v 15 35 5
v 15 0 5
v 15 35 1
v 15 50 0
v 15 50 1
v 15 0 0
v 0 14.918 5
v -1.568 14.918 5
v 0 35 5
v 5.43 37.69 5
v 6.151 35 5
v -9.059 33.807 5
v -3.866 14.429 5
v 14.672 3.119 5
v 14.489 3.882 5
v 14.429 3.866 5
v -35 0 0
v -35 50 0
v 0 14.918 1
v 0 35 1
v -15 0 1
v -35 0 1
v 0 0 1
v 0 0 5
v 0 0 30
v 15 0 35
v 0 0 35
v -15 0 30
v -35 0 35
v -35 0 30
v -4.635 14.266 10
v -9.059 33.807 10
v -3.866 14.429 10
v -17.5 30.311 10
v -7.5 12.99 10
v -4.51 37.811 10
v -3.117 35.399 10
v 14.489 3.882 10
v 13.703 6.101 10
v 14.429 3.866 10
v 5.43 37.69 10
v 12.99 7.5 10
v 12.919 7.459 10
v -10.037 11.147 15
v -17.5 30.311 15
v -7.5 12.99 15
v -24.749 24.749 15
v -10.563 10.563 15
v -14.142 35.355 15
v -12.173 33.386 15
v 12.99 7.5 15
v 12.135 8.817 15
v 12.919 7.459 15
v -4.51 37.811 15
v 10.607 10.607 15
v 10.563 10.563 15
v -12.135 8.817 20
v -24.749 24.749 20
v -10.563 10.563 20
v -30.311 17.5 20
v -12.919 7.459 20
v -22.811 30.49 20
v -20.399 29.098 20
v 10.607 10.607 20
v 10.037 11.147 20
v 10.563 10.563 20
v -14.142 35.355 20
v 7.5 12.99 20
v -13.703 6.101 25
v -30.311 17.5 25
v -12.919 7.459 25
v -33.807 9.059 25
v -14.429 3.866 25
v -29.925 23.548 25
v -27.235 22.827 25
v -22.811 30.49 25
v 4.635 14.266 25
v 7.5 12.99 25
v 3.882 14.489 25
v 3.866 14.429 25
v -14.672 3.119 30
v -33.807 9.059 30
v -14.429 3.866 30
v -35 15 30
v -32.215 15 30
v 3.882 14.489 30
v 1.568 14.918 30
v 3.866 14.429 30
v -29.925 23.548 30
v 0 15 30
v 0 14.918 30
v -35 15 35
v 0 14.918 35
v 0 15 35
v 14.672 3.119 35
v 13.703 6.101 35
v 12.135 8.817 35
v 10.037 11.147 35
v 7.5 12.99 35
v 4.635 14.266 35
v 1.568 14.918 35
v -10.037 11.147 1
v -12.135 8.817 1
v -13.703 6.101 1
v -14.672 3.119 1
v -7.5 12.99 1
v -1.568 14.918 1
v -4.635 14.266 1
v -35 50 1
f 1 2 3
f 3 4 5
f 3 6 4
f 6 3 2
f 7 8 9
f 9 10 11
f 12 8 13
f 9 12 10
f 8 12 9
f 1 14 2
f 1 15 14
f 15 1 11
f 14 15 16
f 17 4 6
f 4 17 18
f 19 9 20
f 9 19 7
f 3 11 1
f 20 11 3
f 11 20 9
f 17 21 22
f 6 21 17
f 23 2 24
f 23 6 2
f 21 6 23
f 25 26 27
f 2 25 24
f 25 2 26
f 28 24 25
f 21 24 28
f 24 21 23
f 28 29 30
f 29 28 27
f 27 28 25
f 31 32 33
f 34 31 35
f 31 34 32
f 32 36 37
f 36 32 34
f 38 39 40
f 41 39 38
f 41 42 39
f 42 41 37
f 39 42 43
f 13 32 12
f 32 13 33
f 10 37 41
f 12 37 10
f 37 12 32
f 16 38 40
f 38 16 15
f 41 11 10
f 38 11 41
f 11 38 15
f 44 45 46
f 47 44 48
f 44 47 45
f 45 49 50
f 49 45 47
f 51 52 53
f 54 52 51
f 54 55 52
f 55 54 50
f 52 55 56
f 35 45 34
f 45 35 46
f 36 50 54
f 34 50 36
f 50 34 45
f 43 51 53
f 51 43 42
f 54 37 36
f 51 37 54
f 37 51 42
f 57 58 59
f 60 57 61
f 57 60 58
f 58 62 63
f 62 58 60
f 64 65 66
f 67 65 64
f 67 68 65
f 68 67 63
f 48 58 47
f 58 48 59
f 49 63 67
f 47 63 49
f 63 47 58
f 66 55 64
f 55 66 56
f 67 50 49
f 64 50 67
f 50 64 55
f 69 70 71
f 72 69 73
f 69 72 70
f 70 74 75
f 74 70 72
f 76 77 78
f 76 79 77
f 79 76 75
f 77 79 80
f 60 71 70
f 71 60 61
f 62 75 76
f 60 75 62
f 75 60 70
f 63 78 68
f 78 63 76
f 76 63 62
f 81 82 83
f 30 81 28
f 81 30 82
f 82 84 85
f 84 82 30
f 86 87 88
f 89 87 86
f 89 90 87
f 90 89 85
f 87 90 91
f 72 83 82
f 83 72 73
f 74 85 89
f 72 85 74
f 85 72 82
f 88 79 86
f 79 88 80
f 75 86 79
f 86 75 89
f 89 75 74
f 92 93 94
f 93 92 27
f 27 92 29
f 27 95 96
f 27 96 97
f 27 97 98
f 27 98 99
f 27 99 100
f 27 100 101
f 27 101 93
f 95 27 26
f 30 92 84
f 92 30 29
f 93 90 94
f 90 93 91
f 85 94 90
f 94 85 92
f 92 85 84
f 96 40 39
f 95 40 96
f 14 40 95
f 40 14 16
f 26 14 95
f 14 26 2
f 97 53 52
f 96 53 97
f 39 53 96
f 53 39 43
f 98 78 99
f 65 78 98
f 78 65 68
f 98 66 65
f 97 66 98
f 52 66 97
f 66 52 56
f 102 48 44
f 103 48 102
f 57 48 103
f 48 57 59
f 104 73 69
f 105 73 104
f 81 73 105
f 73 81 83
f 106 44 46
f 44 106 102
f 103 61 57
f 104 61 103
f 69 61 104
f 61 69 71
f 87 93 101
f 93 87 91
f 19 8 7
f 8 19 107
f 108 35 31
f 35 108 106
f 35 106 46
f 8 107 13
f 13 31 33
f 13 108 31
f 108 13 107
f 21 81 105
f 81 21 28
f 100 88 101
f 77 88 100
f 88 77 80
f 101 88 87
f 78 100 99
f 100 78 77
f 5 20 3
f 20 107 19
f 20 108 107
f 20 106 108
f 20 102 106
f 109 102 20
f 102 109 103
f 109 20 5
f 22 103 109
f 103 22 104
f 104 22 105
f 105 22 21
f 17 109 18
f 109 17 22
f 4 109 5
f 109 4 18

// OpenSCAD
nbm=6; // nombre de marches
lm=35; // largeur d'une marche
hm=5; // hauteur d'une marche
pm=15; //profondeur d'une marche
rc=15; //rayon du cylindre
rotm=15; //rotation d'une marche
for (i=[0:nbm]){
translate([0,0,hm*i]){
rotate([0,0,rotm*i]){
cube([pm,lm,hm],center=false);
}
}
}
difference(){
cylinder(r=rc,h=hm*(nbm+1));
translate([-rc,-rc*2,0]){
cube([rc*2,rc*2,hm*(nbm+2)],center=false);
}   
    }
translate([-35,0,0]){
    cube([50,50,1]);
}
